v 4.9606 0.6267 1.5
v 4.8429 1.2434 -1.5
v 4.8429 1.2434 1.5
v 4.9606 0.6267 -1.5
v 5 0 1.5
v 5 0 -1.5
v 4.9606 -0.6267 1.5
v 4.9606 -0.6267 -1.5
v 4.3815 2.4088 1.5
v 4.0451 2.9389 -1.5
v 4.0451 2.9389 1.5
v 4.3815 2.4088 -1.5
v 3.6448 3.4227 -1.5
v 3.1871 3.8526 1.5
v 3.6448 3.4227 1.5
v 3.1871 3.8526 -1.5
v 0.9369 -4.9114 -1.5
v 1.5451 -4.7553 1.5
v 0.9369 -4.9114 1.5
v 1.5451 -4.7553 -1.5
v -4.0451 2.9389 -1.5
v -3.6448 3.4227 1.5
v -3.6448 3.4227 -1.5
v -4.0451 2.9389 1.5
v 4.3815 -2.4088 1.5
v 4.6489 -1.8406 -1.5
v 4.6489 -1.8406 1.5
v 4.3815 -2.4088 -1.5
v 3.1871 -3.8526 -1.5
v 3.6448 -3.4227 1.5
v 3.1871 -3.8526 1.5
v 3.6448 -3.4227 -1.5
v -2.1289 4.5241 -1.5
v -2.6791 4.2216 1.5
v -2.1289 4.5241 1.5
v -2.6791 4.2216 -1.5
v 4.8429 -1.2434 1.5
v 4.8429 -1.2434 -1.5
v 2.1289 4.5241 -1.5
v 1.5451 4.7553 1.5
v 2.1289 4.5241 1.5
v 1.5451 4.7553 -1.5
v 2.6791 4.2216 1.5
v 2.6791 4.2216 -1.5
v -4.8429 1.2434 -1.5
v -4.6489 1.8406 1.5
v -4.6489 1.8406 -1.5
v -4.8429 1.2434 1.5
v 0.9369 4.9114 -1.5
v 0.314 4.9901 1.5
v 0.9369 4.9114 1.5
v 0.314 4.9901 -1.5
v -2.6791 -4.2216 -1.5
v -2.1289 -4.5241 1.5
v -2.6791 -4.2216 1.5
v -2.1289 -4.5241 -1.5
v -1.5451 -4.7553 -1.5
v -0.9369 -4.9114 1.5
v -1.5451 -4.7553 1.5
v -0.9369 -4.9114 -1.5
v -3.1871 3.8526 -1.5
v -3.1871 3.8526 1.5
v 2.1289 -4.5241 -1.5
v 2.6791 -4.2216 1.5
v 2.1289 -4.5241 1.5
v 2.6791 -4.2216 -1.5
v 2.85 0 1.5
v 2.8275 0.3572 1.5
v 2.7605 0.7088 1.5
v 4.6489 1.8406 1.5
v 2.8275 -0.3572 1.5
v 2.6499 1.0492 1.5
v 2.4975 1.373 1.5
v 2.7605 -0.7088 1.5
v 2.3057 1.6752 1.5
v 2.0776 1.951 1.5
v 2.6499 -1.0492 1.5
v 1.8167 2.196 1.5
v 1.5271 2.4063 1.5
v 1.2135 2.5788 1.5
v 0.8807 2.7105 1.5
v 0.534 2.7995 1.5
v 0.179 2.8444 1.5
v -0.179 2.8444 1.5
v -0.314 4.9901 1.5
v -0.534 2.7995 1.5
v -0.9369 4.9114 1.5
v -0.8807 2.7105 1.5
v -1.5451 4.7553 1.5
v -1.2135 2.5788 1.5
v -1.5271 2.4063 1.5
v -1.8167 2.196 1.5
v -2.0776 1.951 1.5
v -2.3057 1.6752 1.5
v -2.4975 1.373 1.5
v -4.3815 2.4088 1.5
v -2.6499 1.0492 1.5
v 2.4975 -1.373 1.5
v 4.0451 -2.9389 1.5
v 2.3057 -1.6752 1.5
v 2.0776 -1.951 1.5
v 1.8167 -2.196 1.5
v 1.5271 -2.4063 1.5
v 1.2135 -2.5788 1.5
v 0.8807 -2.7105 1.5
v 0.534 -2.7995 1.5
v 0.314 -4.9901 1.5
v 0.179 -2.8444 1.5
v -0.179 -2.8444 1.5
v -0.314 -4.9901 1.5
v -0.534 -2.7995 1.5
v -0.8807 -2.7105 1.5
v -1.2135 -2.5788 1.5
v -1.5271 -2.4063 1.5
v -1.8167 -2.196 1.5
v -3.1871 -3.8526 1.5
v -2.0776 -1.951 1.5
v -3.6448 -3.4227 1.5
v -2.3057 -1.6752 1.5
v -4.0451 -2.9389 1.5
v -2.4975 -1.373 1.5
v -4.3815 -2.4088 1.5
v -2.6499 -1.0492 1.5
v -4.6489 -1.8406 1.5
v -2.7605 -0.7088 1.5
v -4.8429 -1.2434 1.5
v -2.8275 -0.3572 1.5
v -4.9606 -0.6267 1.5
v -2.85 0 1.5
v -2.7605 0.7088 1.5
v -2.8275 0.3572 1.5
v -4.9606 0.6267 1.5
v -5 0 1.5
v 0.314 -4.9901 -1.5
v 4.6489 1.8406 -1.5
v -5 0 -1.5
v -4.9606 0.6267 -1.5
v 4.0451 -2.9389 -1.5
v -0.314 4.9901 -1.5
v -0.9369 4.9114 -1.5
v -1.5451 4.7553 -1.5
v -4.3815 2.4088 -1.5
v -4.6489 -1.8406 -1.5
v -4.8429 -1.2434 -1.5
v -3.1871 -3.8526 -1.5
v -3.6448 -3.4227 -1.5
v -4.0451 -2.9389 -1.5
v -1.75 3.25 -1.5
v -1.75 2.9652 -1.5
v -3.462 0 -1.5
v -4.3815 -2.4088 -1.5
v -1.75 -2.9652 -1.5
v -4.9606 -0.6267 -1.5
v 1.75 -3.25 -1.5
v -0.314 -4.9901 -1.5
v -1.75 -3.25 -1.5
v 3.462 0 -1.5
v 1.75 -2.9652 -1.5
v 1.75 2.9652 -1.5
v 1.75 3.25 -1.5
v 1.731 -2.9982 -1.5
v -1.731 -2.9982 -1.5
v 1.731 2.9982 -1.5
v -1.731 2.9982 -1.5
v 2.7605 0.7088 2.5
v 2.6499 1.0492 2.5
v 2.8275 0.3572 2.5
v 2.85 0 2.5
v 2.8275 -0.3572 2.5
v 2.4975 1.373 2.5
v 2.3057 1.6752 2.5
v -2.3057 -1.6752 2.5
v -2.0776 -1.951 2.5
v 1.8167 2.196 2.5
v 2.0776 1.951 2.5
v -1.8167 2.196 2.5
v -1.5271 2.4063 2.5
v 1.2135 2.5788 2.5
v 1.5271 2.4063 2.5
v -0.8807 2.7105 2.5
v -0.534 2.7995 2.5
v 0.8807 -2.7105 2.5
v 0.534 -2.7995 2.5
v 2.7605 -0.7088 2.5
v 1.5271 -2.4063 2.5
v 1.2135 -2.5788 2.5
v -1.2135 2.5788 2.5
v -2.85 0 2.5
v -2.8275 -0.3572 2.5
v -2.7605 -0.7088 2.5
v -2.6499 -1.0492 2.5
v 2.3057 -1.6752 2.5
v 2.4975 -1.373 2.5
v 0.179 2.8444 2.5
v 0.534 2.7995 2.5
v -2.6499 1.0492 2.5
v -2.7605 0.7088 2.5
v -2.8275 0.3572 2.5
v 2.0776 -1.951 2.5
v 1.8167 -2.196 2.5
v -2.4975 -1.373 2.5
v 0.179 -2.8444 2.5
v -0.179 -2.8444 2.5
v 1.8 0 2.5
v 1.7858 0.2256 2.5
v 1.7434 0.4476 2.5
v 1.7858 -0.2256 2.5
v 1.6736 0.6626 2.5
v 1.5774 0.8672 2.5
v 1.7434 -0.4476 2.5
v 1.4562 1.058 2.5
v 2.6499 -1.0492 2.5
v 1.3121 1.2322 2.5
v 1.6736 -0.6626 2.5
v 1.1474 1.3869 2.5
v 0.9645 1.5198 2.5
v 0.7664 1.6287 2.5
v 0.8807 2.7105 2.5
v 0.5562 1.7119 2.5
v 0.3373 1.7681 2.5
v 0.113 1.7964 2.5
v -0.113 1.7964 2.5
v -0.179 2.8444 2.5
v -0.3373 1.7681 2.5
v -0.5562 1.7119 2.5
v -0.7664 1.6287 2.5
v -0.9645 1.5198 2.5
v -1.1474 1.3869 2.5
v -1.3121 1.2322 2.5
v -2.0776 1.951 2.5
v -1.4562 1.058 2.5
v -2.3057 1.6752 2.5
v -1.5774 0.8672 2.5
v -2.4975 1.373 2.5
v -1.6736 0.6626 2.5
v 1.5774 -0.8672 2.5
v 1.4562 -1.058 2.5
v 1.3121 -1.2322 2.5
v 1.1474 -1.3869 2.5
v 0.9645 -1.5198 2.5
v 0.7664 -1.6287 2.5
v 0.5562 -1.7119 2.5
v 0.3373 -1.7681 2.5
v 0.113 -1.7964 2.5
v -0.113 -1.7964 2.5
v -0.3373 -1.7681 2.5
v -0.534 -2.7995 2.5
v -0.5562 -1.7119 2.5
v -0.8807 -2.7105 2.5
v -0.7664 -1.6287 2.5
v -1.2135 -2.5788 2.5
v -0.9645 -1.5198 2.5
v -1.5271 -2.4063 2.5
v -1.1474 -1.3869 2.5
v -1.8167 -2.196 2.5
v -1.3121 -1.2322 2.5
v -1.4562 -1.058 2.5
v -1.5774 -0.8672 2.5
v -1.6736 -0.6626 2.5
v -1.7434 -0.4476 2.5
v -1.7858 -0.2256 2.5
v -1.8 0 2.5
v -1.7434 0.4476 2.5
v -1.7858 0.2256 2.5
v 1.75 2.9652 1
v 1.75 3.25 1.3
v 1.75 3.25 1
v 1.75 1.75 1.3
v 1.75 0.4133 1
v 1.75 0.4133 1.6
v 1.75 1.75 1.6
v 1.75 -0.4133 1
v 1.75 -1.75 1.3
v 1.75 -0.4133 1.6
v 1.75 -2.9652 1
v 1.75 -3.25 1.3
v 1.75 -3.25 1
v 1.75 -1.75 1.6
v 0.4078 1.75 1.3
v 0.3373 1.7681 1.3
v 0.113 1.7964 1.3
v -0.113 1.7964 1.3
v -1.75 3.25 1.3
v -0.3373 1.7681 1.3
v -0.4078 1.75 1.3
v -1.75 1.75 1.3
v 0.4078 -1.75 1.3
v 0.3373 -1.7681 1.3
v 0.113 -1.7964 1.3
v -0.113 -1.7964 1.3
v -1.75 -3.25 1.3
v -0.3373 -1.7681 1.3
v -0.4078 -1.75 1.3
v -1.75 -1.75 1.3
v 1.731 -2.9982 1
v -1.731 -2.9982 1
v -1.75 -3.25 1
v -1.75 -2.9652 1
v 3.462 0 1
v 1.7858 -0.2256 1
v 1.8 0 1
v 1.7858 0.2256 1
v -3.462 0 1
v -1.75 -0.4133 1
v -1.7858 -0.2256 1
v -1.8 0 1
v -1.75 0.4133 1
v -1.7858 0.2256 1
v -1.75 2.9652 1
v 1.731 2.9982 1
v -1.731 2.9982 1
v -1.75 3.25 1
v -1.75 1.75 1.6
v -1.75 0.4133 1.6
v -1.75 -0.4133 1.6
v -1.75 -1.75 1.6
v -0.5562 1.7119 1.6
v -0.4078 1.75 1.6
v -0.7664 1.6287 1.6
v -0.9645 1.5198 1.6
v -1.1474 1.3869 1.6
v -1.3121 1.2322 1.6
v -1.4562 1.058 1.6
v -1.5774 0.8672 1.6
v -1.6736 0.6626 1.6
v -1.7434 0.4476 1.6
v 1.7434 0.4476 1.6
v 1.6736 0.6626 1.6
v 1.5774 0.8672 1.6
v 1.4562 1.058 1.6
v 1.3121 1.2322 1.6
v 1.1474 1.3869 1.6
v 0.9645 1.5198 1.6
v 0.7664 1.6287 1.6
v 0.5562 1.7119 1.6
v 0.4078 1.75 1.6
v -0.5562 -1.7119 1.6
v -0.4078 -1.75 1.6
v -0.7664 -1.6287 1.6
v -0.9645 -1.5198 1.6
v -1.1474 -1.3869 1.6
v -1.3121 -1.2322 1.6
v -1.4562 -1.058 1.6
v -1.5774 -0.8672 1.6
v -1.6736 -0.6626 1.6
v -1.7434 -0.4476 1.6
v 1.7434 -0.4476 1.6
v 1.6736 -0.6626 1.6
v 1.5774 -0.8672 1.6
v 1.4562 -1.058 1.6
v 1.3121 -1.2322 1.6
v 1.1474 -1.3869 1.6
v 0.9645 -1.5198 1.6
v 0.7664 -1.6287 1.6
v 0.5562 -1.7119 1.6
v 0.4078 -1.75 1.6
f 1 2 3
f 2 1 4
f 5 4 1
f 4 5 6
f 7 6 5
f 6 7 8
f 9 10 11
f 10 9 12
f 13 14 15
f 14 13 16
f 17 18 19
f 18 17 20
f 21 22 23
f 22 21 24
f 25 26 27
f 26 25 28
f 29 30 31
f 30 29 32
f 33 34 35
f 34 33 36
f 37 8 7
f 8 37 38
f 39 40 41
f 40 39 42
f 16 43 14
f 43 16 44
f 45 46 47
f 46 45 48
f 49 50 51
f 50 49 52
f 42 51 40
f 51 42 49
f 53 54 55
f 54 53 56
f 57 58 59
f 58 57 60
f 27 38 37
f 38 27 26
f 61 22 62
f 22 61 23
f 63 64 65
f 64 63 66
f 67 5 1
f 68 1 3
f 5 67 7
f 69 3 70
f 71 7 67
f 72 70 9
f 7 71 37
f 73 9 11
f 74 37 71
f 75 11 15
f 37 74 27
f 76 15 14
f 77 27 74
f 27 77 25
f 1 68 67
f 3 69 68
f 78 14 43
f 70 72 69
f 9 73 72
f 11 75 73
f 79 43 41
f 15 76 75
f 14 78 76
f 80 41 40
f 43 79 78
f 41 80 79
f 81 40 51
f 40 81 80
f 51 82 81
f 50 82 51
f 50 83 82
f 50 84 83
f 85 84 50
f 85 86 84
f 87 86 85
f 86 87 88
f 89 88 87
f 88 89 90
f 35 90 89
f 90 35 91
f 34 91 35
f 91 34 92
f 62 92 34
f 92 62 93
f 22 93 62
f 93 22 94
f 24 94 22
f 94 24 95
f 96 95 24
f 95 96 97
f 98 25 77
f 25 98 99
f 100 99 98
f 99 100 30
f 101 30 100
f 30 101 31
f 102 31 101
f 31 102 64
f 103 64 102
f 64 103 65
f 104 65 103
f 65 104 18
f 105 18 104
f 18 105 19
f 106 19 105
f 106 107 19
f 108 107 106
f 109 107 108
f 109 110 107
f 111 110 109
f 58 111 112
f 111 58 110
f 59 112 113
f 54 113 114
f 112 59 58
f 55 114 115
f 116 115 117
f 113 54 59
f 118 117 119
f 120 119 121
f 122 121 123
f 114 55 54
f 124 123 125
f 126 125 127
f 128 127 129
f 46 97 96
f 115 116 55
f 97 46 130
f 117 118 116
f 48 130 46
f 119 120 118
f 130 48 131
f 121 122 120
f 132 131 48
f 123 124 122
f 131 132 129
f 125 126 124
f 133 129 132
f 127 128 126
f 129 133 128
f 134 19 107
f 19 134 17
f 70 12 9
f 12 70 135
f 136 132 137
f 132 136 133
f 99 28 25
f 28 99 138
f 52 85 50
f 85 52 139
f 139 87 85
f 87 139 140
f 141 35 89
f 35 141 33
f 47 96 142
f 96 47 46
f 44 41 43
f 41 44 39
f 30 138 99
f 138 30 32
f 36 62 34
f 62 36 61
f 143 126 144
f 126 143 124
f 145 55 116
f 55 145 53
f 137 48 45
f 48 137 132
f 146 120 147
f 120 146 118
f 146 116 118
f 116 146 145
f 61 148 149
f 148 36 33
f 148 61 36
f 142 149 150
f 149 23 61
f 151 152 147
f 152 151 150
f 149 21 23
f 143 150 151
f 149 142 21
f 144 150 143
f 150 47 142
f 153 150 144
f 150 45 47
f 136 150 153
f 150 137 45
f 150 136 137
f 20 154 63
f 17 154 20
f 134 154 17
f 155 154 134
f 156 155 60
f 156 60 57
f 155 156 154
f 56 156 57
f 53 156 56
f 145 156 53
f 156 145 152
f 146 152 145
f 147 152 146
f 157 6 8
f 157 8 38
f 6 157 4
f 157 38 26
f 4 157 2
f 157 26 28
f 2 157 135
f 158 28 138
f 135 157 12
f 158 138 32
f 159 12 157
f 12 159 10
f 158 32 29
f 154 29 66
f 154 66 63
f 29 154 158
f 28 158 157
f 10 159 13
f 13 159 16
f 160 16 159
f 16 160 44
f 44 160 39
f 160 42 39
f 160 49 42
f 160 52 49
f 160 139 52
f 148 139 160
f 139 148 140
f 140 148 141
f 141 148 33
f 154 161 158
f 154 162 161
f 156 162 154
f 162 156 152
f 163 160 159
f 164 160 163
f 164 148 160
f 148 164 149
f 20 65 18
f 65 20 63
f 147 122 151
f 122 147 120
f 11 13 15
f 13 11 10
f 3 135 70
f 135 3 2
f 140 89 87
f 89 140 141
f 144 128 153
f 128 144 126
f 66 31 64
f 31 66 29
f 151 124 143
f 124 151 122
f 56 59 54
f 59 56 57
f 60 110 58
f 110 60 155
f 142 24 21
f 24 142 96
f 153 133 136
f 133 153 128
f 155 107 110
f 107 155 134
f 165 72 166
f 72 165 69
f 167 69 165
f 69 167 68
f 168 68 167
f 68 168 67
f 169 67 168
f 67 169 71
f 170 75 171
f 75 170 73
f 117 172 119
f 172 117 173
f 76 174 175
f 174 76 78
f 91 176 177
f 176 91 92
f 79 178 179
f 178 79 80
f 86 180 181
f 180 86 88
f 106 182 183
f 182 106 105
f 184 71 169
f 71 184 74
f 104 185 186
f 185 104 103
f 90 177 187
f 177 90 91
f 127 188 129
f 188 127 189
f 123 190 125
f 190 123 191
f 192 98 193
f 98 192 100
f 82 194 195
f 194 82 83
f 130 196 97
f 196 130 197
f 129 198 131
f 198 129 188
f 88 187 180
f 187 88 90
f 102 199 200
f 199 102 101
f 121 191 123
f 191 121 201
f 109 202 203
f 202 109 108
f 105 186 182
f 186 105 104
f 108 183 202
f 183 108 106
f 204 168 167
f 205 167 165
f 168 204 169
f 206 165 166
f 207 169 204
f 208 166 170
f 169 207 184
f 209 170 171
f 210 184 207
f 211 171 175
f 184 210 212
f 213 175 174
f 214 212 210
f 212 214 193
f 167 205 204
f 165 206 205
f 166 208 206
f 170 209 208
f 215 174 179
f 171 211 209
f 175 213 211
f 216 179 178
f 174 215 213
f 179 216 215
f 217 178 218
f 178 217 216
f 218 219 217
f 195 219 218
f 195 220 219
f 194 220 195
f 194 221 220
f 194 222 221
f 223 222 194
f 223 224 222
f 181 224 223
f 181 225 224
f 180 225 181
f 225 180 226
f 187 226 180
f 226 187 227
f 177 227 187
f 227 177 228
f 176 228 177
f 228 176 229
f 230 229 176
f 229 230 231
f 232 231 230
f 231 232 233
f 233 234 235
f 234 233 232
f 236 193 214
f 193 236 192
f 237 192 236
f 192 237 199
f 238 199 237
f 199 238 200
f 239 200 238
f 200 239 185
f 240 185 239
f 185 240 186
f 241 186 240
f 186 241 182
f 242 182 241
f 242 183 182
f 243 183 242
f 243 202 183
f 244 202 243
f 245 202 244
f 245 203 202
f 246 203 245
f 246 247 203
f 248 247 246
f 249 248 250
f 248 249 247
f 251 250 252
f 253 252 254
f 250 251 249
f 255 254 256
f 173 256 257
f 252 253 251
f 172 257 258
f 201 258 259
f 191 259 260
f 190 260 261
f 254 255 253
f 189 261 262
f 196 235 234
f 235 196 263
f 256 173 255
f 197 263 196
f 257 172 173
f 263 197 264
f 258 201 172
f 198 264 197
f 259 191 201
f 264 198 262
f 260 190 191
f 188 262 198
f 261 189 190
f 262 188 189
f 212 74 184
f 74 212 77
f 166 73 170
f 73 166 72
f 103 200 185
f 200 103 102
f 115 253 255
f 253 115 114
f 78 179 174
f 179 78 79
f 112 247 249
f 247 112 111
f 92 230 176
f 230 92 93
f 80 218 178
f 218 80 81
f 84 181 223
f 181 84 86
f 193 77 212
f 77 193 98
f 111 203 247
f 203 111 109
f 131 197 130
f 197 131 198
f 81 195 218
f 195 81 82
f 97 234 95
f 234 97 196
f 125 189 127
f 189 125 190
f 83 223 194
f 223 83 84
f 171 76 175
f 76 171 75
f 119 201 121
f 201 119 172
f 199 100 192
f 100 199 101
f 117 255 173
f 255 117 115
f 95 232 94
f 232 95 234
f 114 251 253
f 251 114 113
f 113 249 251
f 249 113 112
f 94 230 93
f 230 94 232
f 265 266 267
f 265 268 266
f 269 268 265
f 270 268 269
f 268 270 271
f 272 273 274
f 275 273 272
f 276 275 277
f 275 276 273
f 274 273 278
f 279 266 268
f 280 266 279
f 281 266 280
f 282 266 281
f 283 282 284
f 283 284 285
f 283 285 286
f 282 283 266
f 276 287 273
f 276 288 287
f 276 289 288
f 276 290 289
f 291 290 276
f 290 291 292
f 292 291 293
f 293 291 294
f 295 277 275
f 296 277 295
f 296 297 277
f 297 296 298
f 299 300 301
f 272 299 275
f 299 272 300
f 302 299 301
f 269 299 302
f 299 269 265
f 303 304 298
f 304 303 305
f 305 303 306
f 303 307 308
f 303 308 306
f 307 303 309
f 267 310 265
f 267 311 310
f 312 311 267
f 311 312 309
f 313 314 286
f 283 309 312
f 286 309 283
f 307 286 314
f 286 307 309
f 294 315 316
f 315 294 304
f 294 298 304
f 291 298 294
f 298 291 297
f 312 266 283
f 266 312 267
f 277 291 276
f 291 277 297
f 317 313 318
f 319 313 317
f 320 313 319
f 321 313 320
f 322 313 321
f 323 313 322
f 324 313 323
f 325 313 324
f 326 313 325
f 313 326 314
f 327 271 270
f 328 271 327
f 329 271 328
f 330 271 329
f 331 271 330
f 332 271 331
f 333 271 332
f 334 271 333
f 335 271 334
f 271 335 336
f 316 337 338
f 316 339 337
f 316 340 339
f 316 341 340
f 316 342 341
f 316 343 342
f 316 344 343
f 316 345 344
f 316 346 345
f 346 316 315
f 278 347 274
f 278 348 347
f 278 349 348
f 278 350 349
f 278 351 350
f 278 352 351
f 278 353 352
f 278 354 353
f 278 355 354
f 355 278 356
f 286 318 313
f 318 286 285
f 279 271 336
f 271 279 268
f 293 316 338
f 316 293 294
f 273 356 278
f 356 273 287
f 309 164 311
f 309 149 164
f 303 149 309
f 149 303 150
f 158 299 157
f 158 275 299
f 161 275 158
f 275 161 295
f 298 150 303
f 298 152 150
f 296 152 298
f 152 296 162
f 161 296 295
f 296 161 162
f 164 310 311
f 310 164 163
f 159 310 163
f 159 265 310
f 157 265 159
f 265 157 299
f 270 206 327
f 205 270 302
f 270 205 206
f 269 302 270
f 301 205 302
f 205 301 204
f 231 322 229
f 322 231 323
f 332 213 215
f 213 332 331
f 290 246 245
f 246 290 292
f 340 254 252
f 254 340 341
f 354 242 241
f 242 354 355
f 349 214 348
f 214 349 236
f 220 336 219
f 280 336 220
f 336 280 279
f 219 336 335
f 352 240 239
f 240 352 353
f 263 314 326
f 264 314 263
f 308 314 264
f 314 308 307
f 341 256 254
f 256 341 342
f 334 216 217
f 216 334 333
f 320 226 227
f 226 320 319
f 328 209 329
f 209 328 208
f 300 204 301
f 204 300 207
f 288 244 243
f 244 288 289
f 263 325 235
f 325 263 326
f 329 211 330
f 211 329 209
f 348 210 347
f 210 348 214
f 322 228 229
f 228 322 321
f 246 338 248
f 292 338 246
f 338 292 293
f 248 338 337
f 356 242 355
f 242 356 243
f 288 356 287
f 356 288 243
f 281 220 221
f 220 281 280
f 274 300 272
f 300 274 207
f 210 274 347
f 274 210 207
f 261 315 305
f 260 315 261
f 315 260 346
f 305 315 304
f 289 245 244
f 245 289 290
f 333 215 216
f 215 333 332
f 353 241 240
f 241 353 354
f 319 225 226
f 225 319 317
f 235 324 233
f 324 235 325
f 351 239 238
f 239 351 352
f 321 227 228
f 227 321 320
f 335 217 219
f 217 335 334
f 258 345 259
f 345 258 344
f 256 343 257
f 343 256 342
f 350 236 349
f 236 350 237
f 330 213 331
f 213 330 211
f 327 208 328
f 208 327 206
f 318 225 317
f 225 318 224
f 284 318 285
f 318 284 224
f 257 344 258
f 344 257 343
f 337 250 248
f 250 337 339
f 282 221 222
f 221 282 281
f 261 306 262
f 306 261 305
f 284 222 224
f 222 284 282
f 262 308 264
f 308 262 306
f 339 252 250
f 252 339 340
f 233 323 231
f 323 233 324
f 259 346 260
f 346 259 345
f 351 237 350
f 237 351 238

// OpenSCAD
$fn = 50;


difference() {
	union() {
		translate(v = [0, 0, -1.5000000000]) {
			cylinder(h = 3, r = 5.0000000000);
		}
		translate(v = [0, 0, -1.5000000000]) {
			cylinder(h = 4, r = 2.8500000000);
		}
	}
	union() {
		translate(v = [0, 0, -1.5000000000]) {
			rotate(a = [0, 0, 0]) {
				difference() {
					union() {
						translate(v = [-1.7500000000, -3.2500000000, -0.3000000000]) {
							cube(size = [3.5000000000, 6.5000000000, 0.3000000000]);
						}
						translate(v = [-1.7500000000, -1.7500000000, -0.6000000000]) {
							cube(size = [3.5000000000, 3.5000000000, 0.3000000000]);
						}
						translate(v = [-1.7500000000, -3.2500000000, 2.5000000000]) {
							cube(size = [3.5000000000, 6.5000000000, 0.3000000000]);
						}
						translate(v = [-1.7500000000, -1.7500000000, 2.8000000000]) {
							cube(size = [3.5000000000, 3.5000000000, 0.3000000000]);
						}
						linear_extrude(height = 2.5000000000) {
							polygon(points = [[3.4620000000, 0.0000000000], [1.7310000000, 2.9981799479], [-1.7310000000, 2.9981799479], [-3.4620000000, 0.0000000000], [-1.7310000000, -2.9981799479], [1.7310000000, -2.9981799479]]);
						}
						translate(v = [-1.7500000000, -3.2500000000, -0.3000000000]) {
							cube(size = [3.5000000000, 6.5000000000, 0.3000000000]);
						}
						translate(v = [-1.7500000000, -1.7500000000, -0.6000000000]) {
							cube(size = [3.5000000000, 3.5000000000, 0.3000000000]);
						}
						translate(v = [-1.7500000000, -3.2500000000, 2.5000000000]) {
							cube(size = [3.5000000000, 6.5000000000, 0.3000000000]);
						}
						translate(v = [-1.7500000000, -1.7500000000, 2.8000000000]) {
							cube(size = [3.5000000000, 3.5000000000, 0.3000000000]);
						}
						translate(v = [-1.7500000000, -3.2500000000, -0.3000000000]) {
							cube(size = [3.5000000000, 6.5000000000, 0.3000000000]);
						}
						translate(v = [-1.7500000000, -1.7500000000, -0.6000000000]) {
							cube(size = [3.5000000000, 3.5000000000, 0.3000000000]);
						}
						translate(v = [-1.7500000000, -3.2500000000, 2.5000000000]) {
							cube(size = [3.5000000000, 6.5000000000, 0.3000000000]);
						}
						translate(v = [-1.7500000000, -1.7500000000, 2.8000000000]) {
							cube(size = [3.5000000000, 3.5000000000, 0.3000000000]);
						}
					}
					union();
				}
			}
		}
		translate(v = [0, 0, -100.0000000000]) {
			cylinder(h = 200, r = 1.8000000000);
		}
	}
}
